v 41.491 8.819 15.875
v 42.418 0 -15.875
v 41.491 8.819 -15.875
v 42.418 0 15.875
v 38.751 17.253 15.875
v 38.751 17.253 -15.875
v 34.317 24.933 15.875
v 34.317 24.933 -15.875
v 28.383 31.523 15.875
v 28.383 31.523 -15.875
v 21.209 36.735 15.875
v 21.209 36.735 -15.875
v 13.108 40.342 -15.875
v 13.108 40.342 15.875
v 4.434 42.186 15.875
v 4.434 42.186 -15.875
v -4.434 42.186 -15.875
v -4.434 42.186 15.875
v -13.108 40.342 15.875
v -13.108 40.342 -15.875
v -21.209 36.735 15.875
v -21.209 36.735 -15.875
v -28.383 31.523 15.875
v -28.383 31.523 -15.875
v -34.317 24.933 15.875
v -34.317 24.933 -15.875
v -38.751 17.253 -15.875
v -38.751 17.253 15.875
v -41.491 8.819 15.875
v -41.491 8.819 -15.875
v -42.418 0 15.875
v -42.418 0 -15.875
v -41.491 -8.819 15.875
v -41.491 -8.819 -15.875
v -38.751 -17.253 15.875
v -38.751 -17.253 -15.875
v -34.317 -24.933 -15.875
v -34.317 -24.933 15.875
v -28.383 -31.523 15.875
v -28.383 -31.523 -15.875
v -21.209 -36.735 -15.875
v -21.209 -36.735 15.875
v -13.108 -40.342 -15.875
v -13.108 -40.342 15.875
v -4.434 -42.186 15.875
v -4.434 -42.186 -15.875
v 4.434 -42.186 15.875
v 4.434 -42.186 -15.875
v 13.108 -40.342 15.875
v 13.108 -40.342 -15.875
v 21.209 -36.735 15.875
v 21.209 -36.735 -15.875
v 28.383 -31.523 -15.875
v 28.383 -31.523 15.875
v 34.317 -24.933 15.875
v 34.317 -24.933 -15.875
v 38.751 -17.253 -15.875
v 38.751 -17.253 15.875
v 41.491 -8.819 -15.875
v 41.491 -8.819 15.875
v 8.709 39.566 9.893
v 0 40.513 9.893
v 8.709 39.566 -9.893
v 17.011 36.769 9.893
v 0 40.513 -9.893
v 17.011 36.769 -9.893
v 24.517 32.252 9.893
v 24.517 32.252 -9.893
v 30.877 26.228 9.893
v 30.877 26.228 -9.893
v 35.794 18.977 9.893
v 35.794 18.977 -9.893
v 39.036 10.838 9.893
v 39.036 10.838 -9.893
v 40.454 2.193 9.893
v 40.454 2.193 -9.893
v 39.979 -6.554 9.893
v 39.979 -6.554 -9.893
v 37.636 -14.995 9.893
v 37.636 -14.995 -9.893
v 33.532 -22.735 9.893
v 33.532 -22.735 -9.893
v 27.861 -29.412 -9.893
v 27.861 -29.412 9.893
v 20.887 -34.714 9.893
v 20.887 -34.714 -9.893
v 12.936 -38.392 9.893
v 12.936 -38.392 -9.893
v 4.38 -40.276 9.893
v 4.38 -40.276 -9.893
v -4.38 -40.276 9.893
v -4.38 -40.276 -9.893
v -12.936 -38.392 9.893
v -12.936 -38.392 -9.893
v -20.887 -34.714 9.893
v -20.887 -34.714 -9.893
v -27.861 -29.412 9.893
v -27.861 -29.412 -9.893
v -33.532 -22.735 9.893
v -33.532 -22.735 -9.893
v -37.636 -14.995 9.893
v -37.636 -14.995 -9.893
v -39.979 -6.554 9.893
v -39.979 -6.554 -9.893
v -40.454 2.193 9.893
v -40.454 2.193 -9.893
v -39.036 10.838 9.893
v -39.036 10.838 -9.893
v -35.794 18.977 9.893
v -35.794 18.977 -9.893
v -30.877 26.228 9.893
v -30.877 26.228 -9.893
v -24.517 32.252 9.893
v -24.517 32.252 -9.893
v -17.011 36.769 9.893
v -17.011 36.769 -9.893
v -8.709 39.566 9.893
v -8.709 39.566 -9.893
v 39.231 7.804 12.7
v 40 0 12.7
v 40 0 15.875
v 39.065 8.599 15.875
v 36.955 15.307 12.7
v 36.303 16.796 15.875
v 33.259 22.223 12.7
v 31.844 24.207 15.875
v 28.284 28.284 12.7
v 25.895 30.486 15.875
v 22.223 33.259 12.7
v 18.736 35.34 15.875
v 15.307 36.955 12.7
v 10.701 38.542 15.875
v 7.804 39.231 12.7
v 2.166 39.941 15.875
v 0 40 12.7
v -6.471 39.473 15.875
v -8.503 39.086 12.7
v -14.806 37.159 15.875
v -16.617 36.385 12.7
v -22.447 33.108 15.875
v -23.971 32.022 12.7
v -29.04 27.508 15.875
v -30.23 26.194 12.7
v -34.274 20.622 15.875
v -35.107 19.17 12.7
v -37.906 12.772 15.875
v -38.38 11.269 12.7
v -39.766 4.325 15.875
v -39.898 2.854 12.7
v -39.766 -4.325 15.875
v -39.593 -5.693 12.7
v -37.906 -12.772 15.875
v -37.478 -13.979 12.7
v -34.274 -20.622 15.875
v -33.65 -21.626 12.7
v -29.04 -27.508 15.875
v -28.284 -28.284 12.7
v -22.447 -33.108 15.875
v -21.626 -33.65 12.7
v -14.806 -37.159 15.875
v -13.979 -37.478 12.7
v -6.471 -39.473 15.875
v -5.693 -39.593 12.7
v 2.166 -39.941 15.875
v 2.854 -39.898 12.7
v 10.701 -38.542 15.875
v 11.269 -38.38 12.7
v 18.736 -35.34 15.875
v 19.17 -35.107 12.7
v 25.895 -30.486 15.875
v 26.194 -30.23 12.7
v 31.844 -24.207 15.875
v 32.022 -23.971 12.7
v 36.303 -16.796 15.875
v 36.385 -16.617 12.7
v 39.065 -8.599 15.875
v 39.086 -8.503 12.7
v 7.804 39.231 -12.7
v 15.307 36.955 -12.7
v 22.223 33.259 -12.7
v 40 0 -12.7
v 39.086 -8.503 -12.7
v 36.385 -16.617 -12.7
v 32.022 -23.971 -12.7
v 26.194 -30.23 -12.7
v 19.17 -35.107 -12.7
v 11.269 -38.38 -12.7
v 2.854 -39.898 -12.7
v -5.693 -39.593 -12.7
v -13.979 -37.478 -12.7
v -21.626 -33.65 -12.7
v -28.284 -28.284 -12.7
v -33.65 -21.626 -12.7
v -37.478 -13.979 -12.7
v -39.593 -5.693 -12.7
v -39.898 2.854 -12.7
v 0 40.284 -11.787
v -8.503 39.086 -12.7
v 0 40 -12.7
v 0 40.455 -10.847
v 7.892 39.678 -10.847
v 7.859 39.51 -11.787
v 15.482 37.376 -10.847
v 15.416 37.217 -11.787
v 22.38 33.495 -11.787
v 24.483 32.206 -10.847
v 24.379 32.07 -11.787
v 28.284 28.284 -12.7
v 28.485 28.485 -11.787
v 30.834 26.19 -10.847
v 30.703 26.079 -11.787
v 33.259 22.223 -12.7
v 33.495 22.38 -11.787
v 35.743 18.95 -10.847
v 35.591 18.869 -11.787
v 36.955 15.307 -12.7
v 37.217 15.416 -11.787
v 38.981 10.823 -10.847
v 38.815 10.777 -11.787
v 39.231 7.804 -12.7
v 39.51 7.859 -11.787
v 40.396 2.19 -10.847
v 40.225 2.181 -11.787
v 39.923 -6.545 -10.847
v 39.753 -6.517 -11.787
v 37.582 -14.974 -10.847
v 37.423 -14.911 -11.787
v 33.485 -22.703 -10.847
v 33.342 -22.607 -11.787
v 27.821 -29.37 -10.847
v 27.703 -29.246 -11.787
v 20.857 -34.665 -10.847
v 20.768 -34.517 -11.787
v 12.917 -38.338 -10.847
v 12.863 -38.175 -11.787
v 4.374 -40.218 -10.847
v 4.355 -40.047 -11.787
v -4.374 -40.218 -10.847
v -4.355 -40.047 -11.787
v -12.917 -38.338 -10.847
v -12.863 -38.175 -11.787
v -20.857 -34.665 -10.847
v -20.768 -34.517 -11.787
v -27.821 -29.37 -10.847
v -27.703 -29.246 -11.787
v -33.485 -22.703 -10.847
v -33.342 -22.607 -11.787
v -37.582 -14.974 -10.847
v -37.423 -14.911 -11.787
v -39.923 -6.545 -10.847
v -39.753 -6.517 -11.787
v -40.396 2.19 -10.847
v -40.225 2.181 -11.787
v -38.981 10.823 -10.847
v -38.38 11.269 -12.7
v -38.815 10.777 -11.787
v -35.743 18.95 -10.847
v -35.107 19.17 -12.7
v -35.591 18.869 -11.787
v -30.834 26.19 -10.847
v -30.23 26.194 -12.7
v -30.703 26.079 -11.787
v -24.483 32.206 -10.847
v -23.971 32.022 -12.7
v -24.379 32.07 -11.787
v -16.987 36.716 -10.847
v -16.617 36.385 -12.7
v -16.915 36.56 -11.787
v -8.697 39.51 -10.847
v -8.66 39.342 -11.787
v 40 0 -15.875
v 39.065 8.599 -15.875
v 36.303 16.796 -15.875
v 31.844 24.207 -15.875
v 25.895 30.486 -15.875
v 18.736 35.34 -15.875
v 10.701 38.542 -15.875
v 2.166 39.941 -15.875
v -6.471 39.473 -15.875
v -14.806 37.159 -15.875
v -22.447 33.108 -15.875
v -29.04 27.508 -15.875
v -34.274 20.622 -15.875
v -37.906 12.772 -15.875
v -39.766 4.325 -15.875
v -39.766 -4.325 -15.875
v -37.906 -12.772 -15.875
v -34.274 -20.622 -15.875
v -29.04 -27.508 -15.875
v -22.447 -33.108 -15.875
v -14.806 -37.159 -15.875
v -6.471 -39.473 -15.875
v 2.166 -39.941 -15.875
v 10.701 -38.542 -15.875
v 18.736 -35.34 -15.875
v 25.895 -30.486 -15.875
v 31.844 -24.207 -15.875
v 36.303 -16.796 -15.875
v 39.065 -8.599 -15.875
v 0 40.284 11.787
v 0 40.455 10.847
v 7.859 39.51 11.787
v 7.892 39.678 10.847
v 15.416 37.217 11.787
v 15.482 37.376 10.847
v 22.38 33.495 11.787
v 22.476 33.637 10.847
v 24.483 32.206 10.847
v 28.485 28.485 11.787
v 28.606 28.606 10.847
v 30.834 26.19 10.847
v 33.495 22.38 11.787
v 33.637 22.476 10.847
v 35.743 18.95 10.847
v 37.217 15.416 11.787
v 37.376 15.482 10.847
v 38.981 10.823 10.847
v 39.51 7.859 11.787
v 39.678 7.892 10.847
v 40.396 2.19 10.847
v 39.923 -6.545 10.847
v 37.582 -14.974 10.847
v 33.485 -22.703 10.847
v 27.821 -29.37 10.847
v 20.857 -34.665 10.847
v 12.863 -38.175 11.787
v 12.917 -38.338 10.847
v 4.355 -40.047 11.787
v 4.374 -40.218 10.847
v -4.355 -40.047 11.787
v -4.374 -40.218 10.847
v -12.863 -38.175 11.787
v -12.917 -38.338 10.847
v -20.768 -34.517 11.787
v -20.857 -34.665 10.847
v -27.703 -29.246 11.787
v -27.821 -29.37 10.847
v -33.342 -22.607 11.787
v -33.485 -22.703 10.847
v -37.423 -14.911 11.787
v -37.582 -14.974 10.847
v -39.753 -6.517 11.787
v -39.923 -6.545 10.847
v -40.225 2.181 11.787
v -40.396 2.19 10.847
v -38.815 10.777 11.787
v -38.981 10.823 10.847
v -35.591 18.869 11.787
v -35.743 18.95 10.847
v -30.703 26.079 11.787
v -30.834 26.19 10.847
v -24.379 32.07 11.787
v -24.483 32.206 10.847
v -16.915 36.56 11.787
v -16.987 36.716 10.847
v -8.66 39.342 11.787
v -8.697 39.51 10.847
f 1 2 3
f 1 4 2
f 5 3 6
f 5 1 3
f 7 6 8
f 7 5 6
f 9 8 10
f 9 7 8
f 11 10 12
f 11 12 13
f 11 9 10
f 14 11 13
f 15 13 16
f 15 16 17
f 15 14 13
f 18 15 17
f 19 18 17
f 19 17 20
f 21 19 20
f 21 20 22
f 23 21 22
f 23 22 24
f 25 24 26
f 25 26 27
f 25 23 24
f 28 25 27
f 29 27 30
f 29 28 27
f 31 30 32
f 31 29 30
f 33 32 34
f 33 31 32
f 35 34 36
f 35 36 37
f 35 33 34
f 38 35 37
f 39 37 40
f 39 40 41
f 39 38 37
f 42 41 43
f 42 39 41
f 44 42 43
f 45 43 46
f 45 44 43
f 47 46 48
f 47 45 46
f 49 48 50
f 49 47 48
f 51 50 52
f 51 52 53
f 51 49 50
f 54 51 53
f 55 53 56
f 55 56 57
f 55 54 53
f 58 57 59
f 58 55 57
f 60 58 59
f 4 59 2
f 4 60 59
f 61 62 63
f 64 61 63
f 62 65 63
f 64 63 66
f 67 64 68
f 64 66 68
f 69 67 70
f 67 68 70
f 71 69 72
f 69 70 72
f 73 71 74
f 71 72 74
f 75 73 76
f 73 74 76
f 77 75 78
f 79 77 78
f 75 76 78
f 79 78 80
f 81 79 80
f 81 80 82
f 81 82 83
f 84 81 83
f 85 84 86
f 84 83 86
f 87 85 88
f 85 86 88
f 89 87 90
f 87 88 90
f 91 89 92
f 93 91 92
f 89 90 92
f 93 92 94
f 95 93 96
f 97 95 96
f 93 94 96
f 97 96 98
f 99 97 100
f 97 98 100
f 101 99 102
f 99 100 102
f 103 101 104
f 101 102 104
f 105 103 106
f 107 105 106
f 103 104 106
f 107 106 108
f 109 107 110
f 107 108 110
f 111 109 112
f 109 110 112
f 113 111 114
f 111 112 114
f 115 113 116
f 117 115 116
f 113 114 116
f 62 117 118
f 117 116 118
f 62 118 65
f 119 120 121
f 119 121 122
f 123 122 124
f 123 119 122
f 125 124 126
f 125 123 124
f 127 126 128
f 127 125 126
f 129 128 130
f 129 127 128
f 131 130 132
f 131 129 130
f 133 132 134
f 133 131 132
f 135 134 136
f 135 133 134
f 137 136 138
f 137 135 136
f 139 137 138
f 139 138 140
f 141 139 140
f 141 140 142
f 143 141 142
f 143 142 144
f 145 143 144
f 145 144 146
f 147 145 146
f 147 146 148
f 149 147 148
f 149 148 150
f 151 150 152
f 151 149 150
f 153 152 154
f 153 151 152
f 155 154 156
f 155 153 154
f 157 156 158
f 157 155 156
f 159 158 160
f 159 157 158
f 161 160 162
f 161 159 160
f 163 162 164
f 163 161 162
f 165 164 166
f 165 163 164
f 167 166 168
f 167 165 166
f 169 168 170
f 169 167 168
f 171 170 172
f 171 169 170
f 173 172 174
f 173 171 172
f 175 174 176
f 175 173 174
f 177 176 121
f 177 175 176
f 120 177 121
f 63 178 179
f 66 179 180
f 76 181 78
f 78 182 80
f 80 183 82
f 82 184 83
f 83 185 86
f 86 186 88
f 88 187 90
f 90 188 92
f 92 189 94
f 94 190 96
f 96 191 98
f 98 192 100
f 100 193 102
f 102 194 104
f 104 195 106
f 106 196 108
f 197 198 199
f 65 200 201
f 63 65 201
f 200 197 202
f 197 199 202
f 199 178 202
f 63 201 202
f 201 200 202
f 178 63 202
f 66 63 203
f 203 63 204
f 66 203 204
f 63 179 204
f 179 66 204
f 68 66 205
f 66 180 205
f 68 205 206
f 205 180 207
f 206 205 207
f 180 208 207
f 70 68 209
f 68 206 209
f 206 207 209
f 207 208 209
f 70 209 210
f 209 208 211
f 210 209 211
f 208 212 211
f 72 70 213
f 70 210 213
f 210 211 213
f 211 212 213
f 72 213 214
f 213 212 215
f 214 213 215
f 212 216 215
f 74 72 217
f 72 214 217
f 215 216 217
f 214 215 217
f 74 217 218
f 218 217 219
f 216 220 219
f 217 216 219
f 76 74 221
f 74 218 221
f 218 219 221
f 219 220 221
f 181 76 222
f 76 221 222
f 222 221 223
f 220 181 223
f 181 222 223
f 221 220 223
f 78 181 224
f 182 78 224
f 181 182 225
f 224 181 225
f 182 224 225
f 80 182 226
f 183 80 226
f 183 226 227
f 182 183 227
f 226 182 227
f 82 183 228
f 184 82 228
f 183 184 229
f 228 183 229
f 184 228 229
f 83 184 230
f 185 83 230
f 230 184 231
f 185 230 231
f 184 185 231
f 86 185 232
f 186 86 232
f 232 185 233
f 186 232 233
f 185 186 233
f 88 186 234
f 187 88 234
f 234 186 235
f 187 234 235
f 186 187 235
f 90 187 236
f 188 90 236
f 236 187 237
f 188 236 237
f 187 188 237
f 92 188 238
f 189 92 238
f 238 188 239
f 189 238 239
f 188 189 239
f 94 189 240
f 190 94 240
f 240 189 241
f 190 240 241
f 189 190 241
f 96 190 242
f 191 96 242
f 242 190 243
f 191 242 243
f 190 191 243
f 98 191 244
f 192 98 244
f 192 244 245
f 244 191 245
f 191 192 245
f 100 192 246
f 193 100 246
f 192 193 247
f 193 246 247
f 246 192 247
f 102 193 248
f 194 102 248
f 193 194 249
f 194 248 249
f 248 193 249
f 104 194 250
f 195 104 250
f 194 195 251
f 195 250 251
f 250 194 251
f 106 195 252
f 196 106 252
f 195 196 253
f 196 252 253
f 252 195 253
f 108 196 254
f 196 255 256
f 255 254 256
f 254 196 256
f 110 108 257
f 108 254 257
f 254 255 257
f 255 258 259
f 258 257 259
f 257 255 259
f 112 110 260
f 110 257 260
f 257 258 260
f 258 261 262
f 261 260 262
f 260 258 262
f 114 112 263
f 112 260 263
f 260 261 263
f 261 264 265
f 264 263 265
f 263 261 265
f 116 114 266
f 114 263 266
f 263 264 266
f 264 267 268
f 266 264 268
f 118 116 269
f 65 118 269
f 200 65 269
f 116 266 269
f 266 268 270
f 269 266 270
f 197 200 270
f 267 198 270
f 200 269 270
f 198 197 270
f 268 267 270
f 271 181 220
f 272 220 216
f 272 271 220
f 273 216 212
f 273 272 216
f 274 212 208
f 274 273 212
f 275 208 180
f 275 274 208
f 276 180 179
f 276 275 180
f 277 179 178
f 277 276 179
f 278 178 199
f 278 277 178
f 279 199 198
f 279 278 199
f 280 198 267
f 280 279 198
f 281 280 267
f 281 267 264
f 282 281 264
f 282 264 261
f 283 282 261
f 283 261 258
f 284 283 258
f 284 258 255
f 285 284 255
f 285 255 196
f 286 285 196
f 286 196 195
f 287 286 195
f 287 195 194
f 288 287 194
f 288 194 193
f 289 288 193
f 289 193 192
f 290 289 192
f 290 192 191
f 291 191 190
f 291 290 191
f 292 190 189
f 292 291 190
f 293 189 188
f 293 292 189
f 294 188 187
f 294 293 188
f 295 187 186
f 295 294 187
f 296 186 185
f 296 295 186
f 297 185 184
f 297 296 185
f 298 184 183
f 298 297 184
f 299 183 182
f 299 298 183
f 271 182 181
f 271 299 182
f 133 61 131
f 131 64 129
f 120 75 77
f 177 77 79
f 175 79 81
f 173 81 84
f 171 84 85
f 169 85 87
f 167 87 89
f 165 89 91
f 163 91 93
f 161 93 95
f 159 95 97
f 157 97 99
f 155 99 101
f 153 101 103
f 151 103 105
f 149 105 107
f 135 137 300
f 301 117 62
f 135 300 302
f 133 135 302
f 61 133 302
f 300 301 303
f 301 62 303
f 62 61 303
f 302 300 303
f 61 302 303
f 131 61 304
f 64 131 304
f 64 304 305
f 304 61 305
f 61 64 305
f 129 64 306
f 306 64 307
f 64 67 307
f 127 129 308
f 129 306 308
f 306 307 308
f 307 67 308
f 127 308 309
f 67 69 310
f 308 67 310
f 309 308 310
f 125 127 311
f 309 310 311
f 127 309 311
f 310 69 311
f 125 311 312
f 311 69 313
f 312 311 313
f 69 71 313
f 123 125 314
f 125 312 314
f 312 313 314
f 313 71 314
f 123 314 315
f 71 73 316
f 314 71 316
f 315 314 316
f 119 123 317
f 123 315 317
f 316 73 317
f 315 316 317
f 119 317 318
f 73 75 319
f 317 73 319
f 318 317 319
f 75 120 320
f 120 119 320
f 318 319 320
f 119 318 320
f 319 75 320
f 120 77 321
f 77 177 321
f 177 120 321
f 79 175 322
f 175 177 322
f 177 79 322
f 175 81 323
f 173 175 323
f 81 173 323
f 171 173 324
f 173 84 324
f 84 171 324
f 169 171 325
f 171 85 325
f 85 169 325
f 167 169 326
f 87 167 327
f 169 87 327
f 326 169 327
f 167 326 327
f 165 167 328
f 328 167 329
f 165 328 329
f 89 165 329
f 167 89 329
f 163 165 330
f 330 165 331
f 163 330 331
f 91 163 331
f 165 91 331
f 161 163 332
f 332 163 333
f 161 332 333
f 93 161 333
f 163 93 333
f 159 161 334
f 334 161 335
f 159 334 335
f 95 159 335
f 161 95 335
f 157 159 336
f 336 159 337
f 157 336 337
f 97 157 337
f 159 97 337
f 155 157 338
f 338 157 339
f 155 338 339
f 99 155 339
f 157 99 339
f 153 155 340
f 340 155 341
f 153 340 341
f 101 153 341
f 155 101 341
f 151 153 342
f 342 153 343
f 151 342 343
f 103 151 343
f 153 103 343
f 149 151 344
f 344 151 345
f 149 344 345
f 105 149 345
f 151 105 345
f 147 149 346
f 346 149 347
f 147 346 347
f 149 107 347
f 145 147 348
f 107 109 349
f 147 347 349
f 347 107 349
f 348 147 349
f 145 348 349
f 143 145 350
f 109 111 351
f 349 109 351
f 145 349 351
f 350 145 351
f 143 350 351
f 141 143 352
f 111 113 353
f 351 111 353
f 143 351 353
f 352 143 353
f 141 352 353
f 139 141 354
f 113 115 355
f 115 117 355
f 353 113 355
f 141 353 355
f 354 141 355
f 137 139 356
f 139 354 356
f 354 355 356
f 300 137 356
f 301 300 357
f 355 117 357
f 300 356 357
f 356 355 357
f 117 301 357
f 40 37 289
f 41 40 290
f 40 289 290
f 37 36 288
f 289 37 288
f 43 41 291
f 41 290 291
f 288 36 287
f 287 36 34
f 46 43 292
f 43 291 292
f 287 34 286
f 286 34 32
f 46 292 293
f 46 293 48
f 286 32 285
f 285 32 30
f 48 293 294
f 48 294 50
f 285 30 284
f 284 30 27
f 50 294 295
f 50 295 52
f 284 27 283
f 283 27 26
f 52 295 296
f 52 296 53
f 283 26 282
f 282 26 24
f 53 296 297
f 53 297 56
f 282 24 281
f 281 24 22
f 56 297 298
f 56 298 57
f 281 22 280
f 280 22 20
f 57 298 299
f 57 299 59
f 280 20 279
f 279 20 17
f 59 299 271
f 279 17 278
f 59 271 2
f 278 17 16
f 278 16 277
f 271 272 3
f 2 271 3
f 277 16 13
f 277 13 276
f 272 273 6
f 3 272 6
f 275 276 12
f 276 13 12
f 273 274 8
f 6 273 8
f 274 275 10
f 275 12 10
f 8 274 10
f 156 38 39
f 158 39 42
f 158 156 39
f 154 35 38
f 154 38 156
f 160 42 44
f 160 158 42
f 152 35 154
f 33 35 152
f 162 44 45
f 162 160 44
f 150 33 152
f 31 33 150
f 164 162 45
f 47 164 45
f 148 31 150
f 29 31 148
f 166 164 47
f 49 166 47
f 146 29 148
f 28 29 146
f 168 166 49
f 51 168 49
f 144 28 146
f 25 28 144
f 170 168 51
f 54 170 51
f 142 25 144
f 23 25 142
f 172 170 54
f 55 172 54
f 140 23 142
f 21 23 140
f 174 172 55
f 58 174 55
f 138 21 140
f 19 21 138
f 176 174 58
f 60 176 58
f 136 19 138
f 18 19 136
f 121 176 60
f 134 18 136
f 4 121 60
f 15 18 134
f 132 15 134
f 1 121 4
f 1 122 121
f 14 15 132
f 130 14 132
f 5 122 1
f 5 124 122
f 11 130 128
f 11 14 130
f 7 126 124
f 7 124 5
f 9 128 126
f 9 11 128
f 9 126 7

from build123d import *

# Parameters (mm, degrees)
SKETCH1_R      = 42.418
SKETCH1_R_2    = 40
EXTRUDE1_DEPTH = 15.875


with BuildPart() as part:
    # Sketch1 → Extrude1 (new body, symmetric)
    with BuildSketch(Plane.XY):
        Circle(SKETCH1_R)
        Circle(SKETCH1_R_2, mode=Mode.SUBTRACT)
    extrude(amount=EXTRUDE1_DEPTH, both=True)

    # Sketch2 → Cut-Revolve1 (revolve, cut)
    with BuildSketch(Plane(origin=(0, 0, 0), x_dir=(0, 0, -1), z_dir=(1, 0, 0))):
        with BuildLine():
            Line((-9.892740482, 40.513), (9.892740482, 40.513))
            ThreePointArc((9.892740482, 40.513), (11.31961425, 40.383696815), (12.7, 40))
            Line((12.7, 40), (15.875, 40))
            Line((15.875, 40), (15.875, 0))
            Line((15.875, 0), (-15.875, 0))
            Line((-15.875, 0), (-15.875, 40))
            Line((-15.875, 40), (-12.7, 40))
            ThreePointArc((-12.7, 40), (-11.31961425, 40.383696815), (-9.892740482, 40.513))
        make_face()
    revolve(axis=Axis((0, 0, 15.875), (0, 0, -1)), mode=Mode.SUBTRACT)


solid = part.part
